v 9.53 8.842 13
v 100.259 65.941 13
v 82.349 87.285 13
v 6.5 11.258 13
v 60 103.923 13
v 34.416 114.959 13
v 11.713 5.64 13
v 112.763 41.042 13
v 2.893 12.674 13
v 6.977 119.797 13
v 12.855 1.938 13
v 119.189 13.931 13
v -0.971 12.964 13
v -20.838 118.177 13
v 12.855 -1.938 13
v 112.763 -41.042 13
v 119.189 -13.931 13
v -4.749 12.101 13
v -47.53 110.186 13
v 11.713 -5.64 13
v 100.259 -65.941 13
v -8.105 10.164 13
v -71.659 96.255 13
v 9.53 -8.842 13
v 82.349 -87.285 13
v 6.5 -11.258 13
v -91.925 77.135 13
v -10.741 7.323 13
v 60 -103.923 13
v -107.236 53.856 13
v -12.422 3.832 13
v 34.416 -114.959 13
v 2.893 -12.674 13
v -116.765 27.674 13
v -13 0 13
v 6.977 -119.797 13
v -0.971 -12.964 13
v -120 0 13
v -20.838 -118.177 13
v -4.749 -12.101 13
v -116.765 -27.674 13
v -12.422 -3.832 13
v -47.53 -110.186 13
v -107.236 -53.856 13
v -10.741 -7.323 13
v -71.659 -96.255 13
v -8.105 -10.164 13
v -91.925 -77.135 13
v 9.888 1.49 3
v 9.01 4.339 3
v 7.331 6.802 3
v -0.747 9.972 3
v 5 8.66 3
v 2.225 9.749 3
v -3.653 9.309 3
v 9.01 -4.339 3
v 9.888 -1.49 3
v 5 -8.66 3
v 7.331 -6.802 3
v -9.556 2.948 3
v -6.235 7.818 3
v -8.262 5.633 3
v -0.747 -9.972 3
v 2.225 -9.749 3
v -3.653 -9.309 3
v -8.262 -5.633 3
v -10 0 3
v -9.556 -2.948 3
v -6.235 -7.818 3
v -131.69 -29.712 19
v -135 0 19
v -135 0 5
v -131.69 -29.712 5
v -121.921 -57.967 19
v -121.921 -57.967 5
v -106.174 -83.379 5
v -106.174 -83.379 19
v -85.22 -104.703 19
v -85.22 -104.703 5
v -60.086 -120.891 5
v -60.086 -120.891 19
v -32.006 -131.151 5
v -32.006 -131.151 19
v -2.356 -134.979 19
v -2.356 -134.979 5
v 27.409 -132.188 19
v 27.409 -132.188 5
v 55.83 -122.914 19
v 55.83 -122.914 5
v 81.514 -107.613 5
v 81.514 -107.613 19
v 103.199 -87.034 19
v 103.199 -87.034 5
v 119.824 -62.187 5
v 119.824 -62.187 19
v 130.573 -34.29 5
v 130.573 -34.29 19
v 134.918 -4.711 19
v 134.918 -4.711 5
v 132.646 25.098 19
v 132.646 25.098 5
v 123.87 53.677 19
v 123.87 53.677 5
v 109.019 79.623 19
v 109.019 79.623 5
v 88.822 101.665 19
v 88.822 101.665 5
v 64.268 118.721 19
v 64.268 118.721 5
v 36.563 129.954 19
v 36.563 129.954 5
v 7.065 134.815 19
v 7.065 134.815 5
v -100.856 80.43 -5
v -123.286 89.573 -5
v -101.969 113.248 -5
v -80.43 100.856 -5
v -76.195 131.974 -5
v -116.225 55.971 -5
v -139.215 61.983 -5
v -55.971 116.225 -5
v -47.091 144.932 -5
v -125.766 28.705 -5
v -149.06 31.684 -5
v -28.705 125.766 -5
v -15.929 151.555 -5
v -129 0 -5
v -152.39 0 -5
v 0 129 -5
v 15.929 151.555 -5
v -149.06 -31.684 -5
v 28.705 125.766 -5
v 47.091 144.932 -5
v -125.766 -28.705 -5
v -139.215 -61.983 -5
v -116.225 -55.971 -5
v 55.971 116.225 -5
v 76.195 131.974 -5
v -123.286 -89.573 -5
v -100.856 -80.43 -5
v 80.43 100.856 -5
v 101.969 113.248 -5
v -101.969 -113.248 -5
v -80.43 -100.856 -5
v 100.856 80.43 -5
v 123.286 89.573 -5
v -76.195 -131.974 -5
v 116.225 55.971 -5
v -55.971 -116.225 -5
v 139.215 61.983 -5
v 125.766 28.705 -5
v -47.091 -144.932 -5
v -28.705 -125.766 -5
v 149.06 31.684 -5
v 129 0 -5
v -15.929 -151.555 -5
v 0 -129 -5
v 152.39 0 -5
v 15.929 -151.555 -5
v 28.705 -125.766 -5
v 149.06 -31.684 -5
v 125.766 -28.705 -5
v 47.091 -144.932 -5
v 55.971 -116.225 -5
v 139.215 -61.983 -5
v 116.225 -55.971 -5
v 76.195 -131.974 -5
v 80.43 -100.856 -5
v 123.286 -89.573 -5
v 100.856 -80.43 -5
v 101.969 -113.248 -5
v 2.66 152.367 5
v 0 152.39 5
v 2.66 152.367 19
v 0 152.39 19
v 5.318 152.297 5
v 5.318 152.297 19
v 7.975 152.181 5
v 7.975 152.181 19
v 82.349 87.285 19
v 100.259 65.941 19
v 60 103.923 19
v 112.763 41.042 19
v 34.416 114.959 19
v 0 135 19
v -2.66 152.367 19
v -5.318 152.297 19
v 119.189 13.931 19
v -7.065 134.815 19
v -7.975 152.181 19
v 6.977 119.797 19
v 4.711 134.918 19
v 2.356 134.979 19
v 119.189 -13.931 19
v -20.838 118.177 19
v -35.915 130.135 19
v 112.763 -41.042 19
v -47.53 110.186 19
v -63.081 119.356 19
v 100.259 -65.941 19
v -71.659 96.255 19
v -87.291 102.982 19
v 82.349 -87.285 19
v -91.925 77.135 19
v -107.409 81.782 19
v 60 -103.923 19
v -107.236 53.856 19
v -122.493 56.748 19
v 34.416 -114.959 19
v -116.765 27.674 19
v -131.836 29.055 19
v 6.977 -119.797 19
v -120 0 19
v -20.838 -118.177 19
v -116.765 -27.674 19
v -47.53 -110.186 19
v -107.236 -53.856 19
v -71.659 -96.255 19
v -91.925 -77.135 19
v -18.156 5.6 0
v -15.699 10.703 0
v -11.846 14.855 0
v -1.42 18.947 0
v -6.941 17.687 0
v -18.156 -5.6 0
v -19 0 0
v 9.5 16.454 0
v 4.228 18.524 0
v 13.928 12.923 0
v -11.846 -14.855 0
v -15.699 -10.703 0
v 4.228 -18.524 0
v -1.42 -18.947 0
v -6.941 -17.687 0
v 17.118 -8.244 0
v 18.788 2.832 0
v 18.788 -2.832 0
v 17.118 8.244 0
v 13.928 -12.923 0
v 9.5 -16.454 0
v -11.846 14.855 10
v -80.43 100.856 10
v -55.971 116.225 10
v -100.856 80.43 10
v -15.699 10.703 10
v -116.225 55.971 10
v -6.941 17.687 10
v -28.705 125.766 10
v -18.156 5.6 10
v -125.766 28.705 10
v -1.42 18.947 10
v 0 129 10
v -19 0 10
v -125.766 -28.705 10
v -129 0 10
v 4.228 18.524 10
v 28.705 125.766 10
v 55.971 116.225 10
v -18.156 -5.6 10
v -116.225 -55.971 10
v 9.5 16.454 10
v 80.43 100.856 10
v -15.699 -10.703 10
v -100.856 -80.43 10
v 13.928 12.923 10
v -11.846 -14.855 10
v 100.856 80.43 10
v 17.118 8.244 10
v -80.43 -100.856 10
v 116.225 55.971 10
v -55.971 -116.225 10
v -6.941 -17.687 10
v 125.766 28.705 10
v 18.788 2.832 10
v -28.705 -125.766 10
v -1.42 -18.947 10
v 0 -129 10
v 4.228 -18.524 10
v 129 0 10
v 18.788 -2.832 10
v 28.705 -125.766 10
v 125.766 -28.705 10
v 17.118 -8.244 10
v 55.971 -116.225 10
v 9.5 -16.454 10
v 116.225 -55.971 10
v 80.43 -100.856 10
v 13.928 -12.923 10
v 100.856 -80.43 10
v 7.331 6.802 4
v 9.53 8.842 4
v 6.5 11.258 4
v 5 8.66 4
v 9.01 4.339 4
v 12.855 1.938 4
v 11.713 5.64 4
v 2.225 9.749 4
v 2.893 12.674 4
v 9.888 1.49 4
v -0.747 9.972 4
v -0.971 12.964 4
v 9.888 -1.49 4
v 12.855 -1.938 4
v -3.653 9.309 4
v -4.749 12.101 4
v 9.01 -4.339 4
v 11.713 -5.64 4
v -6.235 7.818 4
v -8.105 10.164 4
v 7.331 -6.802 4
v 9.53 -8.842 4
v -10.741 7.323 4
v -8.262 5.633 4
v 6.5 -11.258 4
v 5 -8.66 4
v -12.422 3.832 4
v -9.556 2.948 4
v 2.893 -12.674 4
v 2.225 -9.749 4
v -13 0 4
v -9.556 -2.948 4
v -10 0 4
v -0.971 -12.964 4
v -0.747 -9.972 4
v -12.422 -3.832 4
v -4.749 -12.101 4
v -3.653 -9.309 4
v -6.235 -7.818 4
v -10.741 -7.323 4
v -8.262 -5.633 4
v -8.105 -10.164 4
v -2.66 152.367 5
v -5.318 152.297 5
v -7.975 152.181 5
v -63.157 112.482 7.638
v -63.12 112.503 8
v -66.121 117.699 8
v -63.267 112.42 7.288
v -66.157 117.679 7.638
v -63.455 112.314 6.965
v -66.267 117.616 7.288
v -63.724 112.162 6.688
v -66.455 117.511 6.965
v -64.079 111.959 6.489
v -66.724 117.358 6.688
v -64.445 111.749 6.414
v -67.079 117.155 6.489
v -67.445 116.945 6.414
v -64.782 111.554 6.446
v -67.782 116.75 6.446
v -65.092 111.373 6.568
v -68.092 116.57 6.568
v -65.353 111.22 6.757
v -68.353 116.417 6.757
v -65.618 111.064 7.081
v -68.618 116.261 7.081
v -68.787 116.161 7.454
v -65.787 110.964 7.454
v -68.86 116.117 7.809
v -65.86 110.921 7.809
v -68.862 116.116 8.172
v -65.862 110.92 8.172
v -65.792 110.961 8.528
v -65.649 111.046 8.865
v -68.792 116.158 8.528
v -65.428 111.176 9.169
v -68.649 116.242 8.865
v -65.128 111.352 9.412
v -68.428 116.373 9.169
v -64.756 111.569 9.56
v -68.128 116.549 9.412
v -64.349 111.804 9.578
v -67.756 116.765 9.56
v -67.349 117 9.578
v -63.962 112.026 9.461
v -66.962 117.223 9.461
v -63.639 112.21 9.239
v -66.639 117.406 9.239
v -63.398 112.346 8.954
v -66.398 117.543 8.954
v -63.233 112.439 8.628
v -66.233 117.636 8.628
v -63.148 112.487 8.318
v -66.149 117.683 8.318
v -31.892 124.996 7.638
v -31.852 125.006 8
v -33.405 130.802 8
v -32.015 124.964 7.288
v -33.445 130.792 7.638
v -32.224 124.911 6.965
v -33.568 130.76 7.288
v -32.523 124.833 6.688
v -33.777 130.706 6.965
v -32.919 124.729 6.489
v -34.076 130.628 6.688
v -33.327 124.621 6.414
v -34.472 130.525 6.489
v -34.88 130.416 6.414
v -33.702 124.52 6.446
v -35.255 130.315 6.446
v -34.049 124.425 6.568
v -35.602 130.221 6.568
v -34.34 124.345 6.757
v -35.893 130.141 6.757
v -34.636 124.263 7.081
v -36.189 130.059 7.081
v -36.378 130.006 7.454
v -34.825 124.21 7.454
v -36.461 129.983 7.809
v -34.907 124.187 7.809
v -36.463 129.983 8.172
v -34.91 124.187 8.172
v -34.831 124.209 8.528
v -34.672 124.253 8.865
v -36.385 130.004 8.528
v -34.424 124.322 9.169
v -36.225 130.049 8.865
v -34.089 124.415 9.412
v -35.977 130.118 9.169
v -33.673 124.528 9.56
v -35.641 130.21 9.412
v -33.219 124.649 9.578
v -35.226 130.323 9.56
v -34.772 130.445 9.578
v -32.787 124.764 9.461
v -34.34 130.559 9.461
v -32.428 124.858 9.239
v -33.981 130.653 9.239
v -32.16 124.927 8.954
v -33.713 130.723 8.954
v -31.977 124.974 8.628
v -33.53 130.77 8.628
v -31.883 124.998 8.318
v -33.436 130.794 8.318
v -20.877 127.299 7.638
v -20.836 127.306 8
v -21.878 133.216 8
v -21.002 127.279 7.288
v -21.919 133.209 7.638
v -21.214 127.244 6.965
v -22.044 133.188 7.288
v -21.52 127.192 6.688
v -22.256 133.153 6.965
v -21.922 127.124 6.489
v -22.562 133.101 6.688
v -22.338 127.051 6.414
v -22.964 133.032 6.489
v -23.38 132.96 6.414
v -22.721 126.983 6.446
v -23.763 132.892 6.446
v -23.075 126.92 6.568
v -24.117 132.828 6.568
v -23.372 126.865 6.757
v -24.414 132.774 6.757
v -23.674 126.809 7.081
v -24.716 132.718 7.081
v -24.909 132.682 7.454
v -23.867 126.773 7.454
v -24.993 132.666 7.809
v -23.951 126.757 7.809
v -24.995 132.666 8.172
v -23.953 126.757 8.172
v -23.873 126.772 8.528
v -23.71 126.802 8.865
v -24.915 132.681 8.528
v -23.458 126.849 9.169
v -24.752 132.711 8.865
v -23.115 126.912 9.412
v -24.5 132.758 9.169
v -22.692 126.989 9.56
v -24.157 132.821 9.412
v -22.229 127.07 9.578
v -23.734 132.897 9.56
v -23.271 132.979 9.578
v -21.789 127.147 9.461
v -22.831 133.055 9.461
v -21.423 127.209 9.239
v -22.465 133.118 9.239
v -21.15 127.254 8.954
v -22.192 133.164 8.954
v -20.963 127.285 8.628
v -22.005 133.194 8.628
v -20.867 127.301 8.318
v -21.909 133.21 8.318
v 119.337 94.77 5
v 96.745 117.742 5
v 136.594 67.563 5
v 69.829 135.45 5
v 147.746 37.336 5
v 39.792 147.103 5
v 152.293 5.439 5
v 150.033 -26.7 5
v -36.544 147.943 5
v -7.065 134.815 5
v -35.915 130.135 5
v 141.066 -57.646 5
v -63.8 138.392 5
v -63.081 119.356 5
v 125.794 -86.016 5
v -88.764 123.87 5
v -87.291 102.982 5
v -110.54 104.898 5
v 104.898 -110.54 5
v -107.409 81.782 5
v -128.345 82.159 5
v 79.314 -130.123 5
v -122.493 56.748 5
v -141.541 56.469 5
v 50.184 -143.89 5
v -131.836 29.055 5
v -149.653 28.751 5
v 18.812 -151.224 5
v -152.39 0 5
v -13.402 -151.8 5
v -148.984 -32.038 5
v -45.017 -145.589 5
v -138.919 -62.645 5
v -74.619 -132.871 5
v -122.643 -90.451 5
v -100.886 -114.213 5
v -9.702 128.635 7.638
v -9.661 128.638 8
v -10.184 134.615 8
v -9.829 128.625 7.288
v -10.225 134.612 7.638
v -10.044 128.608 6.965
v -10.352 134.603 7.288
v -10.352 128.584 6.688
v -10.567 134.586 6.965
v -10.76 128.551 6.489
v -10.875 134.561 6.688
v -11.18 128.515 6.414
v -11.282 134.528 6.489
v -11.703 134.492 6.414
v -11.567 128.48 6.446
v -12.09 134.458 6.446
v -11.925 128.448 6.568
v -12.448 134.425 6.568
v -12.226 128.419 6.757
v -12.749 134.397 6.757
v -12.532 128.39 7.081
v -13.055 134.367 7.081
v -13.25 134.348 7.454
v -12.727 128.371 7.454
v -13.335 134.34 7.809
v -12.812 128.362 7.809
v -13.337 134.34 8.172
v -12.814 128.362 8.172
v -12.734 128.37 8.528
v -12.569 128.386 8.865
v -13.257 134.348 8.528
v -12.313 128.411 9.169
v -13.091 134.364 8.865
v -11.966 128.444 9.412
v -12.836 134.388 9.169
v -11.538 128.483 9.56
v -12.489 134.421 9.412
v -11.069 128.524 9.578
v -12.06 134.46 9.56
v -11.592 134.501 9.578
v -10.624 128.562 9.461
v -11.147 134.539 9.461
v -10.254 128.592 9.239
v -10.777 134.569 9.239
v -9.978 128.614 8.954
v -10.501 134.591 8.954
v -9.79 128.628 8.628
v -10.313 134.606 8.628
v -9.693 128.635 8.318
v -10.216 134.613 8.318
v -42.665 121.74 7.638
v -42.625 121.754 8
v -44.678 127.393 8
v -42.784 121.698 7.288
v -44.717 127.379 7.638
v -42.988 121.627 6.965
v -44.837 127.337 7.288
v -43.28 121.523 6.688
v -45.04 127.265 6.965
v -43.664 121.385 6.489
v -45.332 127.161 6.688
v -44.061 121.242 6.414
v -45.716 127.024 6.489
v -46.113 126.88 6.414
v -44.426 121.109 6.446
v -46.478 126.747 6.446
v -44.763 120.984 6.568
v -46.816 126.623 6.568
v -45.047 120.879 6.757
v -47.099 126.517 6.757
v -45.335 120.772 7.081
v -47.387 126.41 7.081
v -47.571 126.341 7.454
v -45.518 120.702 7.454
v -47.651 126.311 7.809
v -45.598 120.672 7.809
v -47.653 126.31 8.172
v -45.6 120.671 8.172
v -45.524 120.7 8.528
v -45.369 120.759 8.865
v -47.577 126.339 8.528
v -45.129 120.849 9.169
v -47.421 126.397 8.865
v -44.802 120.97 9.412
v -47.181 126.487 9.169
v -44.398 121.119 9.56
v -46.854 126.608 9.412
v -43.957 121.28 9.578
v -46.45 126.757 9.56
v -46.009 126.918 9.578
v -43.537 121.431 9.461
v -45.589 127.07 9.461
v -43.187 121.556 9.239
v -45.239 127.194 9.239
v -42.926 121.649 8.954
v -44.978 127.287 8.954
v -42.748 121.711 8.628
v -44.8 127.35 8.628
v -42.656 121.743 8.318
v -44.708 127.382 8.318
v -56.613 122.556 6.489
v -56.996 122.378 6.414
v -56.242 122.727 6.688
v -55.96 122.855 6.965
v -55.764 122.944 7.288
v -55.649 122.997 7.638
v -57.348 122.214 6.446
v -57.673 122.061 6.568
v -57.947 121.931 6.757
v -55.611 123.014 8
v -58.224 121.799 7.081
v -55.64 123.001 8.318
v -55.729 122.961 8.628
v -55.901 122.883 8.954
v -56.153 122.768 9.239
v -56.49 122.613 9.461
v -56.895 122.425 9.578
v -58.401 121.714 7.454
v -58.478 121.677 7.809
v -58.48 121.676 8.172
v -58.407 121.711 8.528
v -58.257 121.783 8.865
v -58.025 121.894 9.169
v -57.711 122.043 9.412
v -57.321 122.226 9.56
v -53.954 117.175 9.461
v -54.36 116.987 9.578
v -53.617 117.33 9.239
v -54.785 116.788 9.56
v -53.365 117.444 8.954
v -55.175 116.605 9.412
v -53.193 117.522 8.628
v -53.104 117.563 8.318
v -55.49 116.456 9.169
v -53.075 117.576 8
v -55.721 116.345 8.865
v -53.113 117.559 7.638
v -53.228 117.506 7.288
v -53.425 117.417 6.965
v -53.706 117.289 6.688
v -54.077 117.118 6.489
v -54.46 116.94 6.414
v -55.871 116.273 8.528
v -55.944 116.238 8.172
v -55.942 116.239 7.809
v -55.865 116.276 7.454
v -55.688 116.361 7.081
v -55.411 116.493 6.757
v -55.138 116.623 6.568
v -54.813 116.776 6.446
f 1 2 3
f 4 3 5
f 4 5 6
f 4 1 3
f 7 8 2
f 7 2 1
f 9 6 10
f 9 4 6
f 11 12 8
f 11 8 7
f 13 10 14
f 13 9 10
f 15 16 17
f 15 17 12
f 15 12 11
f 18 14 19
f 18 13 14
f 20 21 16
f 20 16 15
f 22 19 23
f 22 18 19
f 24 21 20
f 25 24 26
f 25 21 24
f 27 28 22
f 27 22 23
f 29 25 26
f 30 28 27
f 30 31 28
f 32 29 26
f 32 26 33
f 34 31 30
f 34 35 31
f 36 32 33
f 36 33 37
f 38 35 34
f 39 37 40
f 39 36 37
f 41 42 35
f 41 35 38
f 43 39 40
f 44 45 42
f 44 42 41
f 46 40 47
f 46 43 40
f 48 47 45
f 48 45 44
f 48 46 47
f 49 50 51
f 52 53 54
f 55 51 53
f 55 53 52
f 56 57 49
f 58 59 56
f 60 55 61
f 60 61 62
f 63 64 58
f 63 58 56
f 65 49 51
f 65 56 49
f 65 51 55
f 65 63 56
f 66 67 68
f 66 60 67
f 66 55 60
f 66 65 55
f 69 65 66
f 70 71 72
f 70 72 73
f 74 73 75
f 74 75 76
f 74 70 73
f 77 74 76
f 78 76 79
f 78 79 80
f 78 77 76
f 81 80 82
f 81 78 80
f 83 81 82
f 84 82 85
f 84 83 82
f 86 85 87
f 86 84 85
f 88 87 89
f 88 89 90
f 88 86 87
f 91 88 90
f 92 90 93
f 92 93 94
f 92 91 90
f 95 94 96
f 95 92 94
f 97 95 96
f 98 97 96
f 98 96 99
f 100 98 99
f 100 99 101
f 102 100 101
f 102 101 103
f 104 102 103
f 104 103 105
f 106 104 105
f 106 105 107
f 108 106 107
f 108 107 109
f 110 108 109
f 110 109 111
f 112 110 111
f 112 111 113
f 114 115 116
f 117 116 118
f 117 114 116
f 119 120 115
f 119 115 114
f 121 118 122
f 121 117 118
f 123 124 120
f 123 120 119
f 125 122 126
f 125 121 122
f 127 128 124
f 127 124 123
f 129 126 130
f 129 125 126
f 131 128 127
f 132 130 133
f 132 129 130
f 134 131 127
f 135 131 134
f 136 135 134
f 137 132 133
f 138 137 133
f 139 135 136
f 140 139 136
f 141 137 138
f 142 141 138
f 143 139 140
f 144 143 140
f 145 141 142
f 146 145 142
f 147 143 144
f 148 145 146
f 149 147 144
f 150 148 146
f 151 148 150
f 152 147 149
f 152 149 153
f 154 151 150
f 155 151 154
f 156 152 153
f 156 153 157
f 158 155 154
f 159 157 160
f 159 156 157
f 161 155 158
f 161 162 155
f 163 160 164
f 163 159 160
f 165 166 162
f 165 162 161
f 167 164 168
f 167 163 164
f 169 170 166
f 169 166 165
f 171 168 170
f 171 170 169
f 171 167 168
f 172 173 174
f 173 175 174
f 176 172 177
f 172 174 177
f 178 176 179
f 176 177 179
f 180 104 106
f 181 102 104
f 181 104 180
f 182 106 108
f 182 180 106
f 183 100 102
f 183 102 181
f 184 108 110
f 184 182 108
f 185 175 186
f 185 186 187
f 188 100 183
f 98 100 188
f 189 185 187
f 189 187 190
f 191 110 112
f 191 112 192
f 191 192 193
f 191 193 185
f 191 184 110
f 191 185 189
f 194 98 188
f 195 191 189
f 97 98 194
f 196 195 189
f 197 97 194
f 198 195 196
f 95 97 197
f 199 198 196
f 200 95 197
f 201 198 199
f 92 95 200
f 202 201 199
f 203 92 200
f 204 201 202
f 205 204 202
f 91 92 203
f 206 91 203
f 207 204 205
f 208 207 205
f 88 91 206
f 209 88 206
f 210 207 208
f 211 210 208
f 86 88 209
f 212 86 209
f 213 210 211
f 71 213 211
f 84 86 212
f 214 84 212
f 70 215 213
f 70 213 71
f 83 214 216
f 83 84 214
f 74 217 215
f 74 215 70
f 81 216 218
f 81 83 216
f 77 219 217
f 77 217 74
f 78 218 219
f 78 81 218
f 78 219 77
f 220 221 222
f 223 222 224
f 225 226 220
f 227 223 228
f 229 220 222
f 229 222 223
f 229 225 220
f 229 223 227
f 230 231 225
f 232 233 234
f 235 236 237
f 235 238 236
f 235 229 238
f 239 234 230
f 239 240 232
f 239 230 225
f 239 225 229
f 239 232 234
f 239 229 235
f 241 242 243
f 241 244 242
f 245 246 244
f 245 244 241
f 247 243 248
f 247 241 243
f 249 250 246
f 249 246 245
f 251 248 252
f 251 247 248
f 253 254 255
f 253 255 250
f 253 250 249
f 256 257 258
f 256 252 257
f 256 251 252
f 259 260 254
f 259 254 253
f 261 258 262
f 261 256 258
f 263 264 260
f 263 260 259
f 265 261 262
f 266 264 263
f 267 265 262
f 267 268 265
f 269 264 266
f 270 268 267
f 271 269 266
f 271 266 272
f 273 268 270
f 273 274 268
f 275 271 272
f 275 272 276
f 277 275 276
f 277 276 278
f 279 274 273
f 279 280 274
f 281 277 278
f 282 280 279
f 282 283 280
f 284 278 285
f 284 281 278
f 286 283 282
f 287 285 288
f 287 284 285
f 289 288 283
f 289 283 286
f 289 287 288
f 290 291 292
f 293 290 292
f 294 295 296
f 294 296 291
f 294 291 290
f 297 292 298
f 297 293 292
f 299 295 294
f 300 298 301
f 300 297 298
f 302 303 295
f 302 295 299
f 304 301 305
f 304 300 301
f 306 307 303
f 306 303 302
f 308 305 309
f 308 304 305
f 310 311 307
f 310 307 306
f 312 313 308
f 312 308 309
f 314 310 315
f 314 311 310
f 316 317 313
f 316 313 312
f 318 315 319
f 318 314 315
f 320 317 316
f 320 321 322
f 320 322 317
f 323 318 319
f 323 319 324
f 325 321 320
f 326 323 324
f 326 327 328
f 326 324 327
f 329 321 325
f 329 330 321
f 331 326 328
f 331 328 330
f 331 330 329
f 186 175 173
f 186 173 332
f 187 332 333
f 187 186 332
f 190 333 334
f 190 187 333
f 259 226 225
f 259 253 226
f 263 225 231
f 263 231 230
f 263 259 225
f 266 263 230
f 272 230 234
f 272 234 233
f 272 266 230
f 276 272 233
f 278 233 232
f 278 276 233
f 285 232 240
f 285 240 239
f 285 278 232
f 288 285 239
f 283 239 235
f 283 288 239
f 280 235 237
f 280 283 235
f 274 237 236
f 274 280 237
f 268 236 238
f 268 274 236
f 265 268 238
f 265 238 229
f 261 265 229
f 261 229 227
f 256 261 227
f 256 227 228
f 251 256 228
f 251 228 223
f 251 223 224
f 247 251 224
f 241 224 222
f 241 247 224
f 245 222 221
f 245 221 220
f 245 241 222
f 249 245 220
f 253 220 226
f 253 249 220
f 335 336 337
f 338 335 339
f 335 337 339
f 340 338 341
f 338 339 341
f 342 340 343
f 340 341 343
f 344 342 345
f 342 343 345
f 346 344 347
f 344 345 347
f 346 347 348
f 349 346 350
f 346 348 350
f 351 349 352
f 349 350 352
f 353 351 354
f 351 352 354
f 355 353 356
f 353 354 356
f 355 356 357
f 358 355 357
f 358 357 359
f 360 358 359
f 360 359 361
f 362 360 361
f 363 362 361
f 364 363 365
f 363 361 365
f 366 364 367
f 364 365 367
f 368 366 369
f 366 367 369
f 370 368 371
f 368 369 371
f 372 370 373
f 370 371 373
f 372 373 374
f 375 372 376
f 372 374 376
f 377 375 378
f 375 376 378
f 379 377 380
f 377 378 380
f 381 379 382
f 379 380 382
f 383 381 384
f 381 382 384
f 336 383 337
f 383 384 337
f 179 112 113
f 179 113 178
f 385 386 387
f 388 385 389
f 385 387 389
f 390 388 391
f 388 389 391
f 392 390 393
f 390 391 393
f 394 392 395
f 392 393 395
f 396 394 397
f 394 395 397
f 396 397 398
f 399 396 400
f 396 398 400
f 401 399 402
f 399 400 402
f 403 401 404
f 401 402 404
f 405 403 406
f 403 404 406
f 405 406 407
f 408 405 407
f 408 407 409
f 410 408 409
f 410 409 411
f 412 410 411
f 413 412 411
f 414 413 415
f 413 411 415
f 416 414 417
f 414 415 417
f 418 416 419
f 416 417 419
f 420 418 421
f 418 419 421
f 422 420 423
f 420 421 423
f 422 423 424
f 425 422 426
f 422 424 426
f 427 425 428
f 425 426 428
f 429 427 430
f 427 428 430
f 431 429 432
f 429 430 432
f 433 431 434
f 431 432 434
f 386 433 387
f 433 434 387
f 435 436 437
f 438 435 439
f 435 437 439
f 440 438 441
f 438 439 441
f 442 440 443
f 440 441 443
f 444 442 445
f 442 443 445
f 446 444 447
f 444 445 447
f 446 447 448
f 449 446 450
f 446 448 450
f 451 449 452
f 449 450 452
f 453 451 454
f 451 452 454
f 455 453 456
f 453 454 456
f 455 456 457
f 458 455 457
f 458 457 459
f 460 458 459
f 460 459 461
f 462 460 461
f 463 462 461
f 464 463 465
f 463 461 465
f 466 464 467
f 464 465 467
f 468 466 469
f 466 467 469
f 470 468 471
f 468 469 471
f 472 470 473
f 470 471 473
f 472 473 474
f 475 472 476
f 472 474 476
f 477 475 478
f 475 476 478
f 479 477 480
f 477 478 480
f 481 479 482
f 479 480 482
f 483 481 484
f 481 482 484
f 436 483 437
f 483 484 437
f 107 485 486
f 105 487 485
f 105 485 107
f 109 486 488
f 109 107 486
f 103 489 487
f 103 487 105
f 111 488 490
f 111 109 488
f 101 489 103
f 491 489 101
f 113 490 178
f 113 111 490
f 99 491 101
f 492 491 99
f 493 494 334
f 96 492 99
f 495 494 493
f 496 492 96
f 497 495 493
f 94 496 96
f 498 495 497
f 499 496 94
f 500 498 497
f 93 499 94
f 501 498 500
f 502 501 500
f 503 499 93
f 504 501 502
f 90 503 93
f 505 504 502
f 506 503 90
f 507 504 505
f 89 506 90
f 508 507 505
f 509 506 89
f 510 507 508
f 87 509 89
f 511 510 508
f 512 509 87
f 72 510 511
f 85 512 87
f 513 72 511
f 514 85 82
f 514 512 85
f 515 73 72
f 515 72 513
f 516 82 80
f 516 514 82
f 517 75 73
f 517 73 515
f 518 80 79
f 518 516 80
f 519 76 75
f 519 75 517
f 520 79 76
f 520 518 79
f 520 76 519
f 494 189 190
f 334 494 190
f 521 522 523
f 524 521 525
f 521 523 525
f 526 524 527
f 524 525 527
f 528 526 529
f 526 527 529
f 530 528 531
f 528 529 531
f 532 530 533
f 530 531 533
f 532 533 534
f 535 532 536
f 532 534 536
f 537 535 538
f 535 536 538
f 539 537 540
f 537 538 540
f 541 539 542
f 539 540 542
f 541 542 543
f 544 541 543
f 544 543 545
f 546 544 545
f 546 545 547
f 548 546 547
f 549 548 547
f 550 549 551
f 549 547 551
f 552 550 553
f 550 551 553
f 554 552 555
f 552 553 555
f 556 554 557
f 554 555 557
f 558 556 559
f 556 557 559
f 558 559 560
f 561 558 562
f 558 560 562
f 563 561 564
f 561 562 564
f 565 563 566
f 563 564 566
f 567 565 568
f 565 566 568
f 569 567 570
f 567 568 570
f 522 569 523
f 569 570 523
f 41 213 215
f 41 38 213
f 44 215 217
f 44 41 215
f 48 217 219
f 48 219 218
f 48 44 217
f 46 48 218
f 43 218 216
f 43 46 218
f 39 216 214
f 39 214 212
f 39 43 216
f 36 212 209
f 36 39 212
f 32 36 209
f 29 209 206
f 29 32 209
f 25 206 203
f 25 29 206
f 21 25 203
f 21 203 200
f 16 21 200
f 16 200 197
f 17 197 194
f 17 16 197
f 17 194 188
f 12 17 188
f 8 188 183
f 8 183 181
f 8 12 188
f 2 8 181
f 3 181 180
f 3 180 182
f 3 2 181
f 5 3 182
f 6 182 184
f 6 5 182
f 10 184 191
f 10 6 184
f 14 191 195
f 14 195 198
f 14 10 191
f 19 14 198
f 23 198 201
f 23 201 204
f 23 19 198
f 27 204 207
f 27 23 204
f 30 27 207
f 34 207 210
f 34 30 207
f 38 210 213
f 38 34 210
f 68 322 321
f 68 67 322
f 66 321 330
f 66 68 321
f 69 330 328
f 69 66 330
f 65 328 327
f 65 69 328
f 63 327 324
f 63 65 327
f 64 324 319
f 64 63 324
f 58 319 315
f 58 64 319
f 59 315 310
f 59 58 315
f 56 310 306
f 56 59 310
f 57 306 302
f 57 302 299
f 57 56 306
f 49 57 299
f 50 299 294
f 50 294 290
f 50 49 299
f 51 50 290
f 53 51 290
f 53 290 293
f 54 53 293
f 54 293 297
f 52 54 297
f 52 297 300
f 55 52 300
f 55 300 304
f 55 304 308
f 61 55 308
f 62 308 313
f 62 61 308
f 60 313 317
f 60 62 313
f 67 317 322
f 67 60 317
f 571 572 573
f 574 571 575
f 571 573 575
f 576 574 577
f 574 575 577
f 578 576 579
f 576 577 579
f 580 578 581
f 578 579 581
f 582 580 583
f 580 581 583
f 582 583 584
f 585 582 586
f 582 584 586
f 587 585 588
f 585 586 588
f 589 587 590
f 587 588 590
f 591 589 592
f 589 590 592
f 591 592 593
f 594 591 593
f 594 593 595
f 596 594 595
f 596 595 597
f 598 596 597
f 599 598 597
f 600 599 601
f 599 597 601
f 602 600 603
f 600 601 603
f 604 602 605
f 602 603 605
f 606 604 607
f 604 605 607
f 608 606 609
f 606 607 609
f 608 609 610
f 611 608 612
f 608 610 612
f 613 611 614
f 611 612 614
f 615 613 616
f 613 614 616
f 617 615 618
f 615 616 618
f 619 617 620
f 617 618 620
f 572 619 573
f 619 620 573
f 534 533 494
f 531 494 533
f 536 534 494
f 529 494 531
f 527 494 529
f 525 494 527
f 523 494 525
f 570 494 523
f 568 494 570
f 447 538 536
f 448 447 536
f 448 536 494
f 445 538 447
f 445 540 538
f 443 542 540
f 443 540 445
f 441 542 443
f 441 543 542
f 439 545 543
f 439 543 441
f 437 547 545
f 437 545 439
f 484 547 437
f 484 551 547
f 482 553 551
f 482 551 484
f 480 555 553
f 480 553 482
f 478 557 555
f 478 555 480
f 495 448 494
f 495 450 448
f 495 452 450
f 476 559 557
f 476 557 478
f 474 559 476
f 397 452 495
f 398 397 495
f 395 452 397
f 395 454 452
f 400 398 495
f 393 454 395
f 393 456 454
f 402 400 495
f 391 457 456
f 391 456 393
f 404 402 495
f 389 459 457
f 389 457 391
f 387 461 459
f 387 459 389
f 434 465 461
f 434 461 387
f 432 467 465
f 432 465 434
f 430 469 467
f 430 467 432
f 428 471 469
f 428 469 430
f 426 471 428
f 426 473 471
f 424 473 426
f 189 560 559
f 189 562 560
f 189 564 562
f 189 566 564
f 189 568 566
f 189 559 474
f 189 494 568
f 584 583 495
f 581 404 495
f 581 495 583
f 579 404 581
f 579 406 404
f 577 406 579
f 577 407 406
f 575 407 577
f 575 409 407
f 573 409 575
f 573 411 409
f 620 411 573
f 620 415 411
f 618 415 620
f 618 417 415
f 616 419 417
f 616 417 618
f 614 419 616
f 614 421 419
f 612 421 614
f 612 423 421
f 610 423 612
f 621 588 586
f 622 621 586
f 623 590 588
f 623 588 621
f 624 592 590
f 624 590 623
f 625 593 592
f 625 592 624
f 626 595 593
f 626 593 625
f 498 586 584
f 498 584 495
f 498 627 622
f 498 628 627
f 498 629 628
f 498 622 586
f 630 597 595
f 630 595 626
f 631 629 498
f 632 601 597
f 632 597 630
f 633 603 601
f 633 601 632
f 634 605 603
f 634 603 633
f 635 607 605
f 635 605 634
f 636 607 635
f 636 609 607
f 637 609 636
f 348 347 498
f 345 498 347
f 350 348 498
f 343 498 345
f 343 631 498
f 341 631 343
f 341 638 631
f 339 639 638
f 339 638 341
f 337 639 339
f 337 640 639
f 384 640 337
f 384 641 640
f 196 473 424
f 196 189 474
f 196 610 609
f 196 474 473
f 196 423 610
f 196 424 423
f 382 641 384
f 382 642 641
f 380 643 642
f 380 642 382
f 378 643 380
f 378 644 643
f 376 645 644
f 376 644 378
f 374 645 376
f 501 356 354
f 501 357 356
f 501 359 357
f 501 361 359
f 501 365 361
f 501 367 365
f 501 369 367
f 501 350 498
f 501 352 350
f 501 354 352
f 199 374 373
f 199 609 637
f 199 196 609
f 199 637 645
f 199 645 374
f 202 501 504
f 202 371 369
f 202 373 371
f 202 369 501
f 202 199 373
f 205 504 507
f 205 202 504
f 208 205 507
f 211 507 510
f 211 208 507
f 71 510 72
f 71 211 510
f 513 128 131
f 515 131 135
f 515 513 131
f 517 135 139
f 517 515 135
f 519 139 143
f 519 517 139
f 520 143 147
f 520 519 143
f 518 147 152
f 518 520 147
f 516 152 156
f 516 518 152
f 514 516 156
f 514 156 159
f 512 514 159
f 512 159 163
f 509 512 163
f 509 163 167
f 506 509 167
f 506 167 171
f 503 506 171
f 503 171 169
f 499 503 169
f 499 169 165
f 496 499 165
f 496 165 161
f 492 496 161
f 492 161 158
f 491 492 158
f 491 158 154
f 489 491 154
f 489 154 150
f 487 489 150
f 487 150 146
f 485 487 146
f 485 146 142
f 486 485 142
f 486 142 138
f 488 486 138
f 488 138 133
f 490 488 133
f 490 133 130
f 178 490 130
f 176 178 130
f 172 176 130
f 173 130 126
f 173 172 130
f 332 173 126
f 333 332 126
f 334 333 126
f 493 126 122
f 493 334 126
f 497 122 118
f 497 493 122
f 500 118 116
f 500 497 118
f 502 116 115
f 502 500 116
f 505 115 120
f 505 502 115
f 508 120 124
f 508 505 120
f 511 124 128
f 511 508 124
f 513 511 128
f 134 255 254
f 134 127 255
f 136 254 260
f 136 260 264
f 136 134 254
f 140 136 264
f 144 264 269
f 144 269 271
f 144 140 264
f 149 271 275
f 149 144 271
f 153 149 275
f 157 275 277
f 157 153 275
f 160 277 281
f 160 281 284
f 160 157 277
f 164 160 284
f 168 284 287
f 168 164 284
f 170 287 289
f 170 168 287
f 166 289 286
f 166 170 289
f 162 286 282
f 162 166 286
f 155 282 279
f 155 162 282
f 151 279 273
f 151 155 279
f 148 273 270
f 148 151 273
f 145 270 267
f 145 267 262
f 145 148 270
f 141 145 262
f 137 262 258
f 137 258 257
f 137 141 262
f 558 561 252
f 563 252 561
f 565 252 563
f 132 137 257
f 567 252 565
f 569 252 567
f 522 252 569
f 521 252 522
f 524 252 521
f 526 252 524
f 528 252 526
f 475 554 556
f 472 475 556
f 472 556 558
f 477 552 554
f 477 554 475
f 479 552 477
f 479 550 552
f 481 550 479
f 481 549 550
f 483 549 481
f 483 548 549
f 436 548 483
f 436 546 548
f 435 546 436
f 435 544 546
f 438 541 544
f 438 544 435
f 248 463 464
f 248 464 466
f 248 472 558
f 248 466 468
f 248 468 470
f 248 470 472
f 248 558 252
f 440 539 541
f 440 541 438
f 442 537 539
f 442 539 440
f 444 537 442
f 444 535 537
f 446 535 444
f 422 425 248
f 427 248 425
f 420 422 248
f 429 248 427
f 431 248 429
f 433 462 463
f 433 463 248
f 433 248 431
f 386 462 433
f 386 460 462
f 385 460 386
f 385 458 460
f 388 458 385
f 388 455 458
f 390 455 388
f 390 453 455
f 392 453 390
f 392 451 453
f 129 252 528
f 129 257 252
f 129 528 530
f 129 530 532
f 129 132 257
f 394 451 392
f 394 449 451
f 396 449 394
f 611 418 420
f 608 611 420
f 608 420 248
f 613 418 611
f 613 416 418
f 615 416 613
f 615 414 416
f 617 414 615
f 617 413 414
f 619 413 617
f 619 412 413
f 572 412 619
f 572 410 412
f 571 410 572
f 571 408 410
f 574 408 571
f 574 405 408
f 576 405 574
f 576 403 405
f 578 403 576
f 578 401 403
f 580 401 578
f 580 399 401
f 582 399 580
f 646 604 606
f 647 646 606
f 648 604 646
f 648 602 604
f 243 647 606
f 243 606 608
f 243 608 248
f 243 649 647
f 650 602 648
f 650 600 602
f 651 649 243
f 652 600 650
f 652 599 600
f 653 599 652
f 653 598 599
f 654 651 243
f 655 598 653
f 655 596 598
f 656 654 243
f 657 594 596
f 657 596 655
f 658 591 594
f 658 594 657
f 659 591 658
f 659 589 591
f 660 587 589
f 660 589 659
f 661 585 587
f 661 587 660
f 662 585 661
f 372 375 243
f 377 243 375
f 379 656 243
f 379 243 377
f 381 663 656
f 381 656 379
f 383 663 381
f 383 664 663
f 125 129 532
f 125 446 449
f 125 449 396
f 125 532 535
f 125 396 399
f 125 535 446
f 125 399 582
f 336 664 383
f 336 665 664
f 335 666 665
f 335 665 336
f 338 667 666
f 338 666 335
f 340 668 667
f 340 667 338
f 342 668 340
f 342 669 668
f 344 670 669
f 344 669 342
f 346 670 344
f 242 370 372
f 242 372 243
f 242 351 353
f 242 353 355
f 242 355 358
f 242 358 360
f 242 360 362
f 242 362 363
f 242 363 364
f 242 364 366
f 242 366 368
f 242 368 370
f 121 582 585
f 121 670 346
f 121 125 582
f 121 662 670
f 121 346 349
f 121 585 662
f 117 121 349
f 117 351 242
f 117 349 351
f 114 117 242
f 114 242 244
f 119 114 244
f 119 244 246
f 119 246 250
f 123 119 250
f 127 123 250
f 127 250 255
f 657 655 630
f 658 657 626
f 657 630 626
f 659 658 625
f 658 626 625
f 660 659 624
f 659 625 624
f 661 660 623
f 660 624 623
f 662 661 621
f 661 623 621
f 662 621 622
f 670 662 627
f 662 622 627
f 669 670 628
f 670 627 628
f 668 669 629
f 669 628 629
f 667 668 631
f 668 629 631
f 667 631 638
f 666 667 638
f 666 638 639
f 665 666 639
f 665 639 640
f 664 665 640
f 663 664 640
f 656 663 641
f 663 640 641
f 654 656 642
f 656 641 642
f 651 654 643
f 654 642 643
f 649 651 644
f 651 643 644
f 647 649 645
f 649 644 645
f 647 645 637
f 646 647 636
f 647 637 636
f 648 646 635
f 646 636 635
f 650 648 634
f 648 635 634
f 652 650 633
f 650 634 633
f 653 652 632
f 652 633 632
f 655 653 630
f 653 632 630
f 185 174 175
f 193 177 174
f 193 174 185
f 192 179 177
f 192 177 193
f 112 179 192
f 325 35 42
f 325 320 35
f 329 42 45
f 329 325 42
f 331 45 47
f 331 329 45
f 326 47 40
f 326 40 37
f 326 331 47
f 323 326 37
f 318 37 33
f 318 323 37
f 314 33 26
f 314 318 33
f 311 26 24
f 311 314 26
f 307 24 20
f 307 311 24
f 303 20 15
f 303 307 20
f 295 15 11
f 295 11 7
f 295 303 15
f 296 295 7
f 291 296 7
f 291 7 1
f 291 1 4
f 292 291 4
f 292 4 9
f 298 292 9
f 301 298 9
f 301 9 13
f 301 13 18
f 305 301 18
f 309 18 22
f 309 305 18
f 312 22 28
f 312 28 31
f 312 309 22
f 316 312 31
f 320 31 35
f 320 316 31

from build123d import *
from build123d.topology import SkipClean

# Parameters (mm, degrees)
SKETCH1_3_W              = 17.39
SKETCH1_3_H              = 14
REVOLVE2_ANGLE           = 3
REVOLVE2_OTHER_WAY_ANGLE = 3
CIRPATTERN1_COUNT        = 6
CIRPATTERN1_ANGLE        = 25


with BuildPart() as part:
    # Sketch1 → Revolve1 (revolve)
    with BuildSketch(Plane.YZ, mode=Mode.PRIVATE) as revolve1_sk:
        Polygon((120, 13), (13, 13), (13, 4), (10, 4), (10, 3), (0, 3), (0, 0), (19, 0), (19, 10), (129, 10), (129, -5), (152.39, -5), (152.39, 5), (135, 5), (135, 19), (120, 19), align=None)
    revolve(revolve1_sk.sketch.rotate(Axis((0, 0, 0), (0, 0, 1)), 90), axis=Axis((0, 0, 0), (0, 0, 1)))

    # Sketch1<3> → Revolve2 (revolve)
    with BuildSketch(Plane.YZ):
        with Locations((143.695, 12)):
            Rectangle(SKETCH1_3_W, SKETCH1_3_H)
    revolve(axis=Axis((0, 0, 0), (0, 0, 1)), revolution_arc=REVOLVE2_ANGLE)

    # Sketch1<3> → Revolve2 other way (revolve)
    with SkipClean():  # the faces are left unmerged after this step: merging them gives an invalid solid
        with BuildSketch(Plane.YZ):
            with Locations((143.695, 12)):
                Rectangle(SKETCH1_3_W, SKETCH1_3_H)
        revolve(axis=Axis((0, 0, 0), (0, 0, -1)), revolution_arc=REVOLVE2_OTHER_WAY_ANGLE)
    add(part.part.scale(1), mode=Mode.REPLACE)  # the faces are merged on a copy

    # Sketch2 → Cut-Revolve4 (revolve, cut)
    with BuildSketch(Plane(origin=(0, 0, 8), x_dir=(0, 1, 0), z_dir=(0, 0, 1)), mode=Mode.PRIVATE) as cut_revolve4_sk:
        Polygon((111.823962377, 11.376893011), (151.671750301, 14.863122721), (151.810110042, 13.281663637), (111.962322119, 9.795433927), align=None)
    cut_revolve4 = revolve(cut_revolve4_sk.sketch.rotate(Axis((-9.795433927, 111.962322119, 8), (-0.08715574274765829, 0.9961946980917455, 0)), 180), axis=Axis((-9.795433927, 111.962322119, 8), (-0.08715574274765829, 0.9961946980917455, 0)), mode=Mode.SUBTRACT)

    # CirPattern1: Cut-Revolve4 ×6 about axis
    cirpattern1_axis = Axis((0, 0, 0), (0, 0, 1))
    for i in range(1, CIRPATTERN1_COUNT):
        add(cut_revolve4.rotate(cirpattern1_axis, i * CIRPATTERN1_ANGLE / (CIRPATTERN1_COUNT - 1)), mode=Mode.SUBTRACT)


solid = part.part
